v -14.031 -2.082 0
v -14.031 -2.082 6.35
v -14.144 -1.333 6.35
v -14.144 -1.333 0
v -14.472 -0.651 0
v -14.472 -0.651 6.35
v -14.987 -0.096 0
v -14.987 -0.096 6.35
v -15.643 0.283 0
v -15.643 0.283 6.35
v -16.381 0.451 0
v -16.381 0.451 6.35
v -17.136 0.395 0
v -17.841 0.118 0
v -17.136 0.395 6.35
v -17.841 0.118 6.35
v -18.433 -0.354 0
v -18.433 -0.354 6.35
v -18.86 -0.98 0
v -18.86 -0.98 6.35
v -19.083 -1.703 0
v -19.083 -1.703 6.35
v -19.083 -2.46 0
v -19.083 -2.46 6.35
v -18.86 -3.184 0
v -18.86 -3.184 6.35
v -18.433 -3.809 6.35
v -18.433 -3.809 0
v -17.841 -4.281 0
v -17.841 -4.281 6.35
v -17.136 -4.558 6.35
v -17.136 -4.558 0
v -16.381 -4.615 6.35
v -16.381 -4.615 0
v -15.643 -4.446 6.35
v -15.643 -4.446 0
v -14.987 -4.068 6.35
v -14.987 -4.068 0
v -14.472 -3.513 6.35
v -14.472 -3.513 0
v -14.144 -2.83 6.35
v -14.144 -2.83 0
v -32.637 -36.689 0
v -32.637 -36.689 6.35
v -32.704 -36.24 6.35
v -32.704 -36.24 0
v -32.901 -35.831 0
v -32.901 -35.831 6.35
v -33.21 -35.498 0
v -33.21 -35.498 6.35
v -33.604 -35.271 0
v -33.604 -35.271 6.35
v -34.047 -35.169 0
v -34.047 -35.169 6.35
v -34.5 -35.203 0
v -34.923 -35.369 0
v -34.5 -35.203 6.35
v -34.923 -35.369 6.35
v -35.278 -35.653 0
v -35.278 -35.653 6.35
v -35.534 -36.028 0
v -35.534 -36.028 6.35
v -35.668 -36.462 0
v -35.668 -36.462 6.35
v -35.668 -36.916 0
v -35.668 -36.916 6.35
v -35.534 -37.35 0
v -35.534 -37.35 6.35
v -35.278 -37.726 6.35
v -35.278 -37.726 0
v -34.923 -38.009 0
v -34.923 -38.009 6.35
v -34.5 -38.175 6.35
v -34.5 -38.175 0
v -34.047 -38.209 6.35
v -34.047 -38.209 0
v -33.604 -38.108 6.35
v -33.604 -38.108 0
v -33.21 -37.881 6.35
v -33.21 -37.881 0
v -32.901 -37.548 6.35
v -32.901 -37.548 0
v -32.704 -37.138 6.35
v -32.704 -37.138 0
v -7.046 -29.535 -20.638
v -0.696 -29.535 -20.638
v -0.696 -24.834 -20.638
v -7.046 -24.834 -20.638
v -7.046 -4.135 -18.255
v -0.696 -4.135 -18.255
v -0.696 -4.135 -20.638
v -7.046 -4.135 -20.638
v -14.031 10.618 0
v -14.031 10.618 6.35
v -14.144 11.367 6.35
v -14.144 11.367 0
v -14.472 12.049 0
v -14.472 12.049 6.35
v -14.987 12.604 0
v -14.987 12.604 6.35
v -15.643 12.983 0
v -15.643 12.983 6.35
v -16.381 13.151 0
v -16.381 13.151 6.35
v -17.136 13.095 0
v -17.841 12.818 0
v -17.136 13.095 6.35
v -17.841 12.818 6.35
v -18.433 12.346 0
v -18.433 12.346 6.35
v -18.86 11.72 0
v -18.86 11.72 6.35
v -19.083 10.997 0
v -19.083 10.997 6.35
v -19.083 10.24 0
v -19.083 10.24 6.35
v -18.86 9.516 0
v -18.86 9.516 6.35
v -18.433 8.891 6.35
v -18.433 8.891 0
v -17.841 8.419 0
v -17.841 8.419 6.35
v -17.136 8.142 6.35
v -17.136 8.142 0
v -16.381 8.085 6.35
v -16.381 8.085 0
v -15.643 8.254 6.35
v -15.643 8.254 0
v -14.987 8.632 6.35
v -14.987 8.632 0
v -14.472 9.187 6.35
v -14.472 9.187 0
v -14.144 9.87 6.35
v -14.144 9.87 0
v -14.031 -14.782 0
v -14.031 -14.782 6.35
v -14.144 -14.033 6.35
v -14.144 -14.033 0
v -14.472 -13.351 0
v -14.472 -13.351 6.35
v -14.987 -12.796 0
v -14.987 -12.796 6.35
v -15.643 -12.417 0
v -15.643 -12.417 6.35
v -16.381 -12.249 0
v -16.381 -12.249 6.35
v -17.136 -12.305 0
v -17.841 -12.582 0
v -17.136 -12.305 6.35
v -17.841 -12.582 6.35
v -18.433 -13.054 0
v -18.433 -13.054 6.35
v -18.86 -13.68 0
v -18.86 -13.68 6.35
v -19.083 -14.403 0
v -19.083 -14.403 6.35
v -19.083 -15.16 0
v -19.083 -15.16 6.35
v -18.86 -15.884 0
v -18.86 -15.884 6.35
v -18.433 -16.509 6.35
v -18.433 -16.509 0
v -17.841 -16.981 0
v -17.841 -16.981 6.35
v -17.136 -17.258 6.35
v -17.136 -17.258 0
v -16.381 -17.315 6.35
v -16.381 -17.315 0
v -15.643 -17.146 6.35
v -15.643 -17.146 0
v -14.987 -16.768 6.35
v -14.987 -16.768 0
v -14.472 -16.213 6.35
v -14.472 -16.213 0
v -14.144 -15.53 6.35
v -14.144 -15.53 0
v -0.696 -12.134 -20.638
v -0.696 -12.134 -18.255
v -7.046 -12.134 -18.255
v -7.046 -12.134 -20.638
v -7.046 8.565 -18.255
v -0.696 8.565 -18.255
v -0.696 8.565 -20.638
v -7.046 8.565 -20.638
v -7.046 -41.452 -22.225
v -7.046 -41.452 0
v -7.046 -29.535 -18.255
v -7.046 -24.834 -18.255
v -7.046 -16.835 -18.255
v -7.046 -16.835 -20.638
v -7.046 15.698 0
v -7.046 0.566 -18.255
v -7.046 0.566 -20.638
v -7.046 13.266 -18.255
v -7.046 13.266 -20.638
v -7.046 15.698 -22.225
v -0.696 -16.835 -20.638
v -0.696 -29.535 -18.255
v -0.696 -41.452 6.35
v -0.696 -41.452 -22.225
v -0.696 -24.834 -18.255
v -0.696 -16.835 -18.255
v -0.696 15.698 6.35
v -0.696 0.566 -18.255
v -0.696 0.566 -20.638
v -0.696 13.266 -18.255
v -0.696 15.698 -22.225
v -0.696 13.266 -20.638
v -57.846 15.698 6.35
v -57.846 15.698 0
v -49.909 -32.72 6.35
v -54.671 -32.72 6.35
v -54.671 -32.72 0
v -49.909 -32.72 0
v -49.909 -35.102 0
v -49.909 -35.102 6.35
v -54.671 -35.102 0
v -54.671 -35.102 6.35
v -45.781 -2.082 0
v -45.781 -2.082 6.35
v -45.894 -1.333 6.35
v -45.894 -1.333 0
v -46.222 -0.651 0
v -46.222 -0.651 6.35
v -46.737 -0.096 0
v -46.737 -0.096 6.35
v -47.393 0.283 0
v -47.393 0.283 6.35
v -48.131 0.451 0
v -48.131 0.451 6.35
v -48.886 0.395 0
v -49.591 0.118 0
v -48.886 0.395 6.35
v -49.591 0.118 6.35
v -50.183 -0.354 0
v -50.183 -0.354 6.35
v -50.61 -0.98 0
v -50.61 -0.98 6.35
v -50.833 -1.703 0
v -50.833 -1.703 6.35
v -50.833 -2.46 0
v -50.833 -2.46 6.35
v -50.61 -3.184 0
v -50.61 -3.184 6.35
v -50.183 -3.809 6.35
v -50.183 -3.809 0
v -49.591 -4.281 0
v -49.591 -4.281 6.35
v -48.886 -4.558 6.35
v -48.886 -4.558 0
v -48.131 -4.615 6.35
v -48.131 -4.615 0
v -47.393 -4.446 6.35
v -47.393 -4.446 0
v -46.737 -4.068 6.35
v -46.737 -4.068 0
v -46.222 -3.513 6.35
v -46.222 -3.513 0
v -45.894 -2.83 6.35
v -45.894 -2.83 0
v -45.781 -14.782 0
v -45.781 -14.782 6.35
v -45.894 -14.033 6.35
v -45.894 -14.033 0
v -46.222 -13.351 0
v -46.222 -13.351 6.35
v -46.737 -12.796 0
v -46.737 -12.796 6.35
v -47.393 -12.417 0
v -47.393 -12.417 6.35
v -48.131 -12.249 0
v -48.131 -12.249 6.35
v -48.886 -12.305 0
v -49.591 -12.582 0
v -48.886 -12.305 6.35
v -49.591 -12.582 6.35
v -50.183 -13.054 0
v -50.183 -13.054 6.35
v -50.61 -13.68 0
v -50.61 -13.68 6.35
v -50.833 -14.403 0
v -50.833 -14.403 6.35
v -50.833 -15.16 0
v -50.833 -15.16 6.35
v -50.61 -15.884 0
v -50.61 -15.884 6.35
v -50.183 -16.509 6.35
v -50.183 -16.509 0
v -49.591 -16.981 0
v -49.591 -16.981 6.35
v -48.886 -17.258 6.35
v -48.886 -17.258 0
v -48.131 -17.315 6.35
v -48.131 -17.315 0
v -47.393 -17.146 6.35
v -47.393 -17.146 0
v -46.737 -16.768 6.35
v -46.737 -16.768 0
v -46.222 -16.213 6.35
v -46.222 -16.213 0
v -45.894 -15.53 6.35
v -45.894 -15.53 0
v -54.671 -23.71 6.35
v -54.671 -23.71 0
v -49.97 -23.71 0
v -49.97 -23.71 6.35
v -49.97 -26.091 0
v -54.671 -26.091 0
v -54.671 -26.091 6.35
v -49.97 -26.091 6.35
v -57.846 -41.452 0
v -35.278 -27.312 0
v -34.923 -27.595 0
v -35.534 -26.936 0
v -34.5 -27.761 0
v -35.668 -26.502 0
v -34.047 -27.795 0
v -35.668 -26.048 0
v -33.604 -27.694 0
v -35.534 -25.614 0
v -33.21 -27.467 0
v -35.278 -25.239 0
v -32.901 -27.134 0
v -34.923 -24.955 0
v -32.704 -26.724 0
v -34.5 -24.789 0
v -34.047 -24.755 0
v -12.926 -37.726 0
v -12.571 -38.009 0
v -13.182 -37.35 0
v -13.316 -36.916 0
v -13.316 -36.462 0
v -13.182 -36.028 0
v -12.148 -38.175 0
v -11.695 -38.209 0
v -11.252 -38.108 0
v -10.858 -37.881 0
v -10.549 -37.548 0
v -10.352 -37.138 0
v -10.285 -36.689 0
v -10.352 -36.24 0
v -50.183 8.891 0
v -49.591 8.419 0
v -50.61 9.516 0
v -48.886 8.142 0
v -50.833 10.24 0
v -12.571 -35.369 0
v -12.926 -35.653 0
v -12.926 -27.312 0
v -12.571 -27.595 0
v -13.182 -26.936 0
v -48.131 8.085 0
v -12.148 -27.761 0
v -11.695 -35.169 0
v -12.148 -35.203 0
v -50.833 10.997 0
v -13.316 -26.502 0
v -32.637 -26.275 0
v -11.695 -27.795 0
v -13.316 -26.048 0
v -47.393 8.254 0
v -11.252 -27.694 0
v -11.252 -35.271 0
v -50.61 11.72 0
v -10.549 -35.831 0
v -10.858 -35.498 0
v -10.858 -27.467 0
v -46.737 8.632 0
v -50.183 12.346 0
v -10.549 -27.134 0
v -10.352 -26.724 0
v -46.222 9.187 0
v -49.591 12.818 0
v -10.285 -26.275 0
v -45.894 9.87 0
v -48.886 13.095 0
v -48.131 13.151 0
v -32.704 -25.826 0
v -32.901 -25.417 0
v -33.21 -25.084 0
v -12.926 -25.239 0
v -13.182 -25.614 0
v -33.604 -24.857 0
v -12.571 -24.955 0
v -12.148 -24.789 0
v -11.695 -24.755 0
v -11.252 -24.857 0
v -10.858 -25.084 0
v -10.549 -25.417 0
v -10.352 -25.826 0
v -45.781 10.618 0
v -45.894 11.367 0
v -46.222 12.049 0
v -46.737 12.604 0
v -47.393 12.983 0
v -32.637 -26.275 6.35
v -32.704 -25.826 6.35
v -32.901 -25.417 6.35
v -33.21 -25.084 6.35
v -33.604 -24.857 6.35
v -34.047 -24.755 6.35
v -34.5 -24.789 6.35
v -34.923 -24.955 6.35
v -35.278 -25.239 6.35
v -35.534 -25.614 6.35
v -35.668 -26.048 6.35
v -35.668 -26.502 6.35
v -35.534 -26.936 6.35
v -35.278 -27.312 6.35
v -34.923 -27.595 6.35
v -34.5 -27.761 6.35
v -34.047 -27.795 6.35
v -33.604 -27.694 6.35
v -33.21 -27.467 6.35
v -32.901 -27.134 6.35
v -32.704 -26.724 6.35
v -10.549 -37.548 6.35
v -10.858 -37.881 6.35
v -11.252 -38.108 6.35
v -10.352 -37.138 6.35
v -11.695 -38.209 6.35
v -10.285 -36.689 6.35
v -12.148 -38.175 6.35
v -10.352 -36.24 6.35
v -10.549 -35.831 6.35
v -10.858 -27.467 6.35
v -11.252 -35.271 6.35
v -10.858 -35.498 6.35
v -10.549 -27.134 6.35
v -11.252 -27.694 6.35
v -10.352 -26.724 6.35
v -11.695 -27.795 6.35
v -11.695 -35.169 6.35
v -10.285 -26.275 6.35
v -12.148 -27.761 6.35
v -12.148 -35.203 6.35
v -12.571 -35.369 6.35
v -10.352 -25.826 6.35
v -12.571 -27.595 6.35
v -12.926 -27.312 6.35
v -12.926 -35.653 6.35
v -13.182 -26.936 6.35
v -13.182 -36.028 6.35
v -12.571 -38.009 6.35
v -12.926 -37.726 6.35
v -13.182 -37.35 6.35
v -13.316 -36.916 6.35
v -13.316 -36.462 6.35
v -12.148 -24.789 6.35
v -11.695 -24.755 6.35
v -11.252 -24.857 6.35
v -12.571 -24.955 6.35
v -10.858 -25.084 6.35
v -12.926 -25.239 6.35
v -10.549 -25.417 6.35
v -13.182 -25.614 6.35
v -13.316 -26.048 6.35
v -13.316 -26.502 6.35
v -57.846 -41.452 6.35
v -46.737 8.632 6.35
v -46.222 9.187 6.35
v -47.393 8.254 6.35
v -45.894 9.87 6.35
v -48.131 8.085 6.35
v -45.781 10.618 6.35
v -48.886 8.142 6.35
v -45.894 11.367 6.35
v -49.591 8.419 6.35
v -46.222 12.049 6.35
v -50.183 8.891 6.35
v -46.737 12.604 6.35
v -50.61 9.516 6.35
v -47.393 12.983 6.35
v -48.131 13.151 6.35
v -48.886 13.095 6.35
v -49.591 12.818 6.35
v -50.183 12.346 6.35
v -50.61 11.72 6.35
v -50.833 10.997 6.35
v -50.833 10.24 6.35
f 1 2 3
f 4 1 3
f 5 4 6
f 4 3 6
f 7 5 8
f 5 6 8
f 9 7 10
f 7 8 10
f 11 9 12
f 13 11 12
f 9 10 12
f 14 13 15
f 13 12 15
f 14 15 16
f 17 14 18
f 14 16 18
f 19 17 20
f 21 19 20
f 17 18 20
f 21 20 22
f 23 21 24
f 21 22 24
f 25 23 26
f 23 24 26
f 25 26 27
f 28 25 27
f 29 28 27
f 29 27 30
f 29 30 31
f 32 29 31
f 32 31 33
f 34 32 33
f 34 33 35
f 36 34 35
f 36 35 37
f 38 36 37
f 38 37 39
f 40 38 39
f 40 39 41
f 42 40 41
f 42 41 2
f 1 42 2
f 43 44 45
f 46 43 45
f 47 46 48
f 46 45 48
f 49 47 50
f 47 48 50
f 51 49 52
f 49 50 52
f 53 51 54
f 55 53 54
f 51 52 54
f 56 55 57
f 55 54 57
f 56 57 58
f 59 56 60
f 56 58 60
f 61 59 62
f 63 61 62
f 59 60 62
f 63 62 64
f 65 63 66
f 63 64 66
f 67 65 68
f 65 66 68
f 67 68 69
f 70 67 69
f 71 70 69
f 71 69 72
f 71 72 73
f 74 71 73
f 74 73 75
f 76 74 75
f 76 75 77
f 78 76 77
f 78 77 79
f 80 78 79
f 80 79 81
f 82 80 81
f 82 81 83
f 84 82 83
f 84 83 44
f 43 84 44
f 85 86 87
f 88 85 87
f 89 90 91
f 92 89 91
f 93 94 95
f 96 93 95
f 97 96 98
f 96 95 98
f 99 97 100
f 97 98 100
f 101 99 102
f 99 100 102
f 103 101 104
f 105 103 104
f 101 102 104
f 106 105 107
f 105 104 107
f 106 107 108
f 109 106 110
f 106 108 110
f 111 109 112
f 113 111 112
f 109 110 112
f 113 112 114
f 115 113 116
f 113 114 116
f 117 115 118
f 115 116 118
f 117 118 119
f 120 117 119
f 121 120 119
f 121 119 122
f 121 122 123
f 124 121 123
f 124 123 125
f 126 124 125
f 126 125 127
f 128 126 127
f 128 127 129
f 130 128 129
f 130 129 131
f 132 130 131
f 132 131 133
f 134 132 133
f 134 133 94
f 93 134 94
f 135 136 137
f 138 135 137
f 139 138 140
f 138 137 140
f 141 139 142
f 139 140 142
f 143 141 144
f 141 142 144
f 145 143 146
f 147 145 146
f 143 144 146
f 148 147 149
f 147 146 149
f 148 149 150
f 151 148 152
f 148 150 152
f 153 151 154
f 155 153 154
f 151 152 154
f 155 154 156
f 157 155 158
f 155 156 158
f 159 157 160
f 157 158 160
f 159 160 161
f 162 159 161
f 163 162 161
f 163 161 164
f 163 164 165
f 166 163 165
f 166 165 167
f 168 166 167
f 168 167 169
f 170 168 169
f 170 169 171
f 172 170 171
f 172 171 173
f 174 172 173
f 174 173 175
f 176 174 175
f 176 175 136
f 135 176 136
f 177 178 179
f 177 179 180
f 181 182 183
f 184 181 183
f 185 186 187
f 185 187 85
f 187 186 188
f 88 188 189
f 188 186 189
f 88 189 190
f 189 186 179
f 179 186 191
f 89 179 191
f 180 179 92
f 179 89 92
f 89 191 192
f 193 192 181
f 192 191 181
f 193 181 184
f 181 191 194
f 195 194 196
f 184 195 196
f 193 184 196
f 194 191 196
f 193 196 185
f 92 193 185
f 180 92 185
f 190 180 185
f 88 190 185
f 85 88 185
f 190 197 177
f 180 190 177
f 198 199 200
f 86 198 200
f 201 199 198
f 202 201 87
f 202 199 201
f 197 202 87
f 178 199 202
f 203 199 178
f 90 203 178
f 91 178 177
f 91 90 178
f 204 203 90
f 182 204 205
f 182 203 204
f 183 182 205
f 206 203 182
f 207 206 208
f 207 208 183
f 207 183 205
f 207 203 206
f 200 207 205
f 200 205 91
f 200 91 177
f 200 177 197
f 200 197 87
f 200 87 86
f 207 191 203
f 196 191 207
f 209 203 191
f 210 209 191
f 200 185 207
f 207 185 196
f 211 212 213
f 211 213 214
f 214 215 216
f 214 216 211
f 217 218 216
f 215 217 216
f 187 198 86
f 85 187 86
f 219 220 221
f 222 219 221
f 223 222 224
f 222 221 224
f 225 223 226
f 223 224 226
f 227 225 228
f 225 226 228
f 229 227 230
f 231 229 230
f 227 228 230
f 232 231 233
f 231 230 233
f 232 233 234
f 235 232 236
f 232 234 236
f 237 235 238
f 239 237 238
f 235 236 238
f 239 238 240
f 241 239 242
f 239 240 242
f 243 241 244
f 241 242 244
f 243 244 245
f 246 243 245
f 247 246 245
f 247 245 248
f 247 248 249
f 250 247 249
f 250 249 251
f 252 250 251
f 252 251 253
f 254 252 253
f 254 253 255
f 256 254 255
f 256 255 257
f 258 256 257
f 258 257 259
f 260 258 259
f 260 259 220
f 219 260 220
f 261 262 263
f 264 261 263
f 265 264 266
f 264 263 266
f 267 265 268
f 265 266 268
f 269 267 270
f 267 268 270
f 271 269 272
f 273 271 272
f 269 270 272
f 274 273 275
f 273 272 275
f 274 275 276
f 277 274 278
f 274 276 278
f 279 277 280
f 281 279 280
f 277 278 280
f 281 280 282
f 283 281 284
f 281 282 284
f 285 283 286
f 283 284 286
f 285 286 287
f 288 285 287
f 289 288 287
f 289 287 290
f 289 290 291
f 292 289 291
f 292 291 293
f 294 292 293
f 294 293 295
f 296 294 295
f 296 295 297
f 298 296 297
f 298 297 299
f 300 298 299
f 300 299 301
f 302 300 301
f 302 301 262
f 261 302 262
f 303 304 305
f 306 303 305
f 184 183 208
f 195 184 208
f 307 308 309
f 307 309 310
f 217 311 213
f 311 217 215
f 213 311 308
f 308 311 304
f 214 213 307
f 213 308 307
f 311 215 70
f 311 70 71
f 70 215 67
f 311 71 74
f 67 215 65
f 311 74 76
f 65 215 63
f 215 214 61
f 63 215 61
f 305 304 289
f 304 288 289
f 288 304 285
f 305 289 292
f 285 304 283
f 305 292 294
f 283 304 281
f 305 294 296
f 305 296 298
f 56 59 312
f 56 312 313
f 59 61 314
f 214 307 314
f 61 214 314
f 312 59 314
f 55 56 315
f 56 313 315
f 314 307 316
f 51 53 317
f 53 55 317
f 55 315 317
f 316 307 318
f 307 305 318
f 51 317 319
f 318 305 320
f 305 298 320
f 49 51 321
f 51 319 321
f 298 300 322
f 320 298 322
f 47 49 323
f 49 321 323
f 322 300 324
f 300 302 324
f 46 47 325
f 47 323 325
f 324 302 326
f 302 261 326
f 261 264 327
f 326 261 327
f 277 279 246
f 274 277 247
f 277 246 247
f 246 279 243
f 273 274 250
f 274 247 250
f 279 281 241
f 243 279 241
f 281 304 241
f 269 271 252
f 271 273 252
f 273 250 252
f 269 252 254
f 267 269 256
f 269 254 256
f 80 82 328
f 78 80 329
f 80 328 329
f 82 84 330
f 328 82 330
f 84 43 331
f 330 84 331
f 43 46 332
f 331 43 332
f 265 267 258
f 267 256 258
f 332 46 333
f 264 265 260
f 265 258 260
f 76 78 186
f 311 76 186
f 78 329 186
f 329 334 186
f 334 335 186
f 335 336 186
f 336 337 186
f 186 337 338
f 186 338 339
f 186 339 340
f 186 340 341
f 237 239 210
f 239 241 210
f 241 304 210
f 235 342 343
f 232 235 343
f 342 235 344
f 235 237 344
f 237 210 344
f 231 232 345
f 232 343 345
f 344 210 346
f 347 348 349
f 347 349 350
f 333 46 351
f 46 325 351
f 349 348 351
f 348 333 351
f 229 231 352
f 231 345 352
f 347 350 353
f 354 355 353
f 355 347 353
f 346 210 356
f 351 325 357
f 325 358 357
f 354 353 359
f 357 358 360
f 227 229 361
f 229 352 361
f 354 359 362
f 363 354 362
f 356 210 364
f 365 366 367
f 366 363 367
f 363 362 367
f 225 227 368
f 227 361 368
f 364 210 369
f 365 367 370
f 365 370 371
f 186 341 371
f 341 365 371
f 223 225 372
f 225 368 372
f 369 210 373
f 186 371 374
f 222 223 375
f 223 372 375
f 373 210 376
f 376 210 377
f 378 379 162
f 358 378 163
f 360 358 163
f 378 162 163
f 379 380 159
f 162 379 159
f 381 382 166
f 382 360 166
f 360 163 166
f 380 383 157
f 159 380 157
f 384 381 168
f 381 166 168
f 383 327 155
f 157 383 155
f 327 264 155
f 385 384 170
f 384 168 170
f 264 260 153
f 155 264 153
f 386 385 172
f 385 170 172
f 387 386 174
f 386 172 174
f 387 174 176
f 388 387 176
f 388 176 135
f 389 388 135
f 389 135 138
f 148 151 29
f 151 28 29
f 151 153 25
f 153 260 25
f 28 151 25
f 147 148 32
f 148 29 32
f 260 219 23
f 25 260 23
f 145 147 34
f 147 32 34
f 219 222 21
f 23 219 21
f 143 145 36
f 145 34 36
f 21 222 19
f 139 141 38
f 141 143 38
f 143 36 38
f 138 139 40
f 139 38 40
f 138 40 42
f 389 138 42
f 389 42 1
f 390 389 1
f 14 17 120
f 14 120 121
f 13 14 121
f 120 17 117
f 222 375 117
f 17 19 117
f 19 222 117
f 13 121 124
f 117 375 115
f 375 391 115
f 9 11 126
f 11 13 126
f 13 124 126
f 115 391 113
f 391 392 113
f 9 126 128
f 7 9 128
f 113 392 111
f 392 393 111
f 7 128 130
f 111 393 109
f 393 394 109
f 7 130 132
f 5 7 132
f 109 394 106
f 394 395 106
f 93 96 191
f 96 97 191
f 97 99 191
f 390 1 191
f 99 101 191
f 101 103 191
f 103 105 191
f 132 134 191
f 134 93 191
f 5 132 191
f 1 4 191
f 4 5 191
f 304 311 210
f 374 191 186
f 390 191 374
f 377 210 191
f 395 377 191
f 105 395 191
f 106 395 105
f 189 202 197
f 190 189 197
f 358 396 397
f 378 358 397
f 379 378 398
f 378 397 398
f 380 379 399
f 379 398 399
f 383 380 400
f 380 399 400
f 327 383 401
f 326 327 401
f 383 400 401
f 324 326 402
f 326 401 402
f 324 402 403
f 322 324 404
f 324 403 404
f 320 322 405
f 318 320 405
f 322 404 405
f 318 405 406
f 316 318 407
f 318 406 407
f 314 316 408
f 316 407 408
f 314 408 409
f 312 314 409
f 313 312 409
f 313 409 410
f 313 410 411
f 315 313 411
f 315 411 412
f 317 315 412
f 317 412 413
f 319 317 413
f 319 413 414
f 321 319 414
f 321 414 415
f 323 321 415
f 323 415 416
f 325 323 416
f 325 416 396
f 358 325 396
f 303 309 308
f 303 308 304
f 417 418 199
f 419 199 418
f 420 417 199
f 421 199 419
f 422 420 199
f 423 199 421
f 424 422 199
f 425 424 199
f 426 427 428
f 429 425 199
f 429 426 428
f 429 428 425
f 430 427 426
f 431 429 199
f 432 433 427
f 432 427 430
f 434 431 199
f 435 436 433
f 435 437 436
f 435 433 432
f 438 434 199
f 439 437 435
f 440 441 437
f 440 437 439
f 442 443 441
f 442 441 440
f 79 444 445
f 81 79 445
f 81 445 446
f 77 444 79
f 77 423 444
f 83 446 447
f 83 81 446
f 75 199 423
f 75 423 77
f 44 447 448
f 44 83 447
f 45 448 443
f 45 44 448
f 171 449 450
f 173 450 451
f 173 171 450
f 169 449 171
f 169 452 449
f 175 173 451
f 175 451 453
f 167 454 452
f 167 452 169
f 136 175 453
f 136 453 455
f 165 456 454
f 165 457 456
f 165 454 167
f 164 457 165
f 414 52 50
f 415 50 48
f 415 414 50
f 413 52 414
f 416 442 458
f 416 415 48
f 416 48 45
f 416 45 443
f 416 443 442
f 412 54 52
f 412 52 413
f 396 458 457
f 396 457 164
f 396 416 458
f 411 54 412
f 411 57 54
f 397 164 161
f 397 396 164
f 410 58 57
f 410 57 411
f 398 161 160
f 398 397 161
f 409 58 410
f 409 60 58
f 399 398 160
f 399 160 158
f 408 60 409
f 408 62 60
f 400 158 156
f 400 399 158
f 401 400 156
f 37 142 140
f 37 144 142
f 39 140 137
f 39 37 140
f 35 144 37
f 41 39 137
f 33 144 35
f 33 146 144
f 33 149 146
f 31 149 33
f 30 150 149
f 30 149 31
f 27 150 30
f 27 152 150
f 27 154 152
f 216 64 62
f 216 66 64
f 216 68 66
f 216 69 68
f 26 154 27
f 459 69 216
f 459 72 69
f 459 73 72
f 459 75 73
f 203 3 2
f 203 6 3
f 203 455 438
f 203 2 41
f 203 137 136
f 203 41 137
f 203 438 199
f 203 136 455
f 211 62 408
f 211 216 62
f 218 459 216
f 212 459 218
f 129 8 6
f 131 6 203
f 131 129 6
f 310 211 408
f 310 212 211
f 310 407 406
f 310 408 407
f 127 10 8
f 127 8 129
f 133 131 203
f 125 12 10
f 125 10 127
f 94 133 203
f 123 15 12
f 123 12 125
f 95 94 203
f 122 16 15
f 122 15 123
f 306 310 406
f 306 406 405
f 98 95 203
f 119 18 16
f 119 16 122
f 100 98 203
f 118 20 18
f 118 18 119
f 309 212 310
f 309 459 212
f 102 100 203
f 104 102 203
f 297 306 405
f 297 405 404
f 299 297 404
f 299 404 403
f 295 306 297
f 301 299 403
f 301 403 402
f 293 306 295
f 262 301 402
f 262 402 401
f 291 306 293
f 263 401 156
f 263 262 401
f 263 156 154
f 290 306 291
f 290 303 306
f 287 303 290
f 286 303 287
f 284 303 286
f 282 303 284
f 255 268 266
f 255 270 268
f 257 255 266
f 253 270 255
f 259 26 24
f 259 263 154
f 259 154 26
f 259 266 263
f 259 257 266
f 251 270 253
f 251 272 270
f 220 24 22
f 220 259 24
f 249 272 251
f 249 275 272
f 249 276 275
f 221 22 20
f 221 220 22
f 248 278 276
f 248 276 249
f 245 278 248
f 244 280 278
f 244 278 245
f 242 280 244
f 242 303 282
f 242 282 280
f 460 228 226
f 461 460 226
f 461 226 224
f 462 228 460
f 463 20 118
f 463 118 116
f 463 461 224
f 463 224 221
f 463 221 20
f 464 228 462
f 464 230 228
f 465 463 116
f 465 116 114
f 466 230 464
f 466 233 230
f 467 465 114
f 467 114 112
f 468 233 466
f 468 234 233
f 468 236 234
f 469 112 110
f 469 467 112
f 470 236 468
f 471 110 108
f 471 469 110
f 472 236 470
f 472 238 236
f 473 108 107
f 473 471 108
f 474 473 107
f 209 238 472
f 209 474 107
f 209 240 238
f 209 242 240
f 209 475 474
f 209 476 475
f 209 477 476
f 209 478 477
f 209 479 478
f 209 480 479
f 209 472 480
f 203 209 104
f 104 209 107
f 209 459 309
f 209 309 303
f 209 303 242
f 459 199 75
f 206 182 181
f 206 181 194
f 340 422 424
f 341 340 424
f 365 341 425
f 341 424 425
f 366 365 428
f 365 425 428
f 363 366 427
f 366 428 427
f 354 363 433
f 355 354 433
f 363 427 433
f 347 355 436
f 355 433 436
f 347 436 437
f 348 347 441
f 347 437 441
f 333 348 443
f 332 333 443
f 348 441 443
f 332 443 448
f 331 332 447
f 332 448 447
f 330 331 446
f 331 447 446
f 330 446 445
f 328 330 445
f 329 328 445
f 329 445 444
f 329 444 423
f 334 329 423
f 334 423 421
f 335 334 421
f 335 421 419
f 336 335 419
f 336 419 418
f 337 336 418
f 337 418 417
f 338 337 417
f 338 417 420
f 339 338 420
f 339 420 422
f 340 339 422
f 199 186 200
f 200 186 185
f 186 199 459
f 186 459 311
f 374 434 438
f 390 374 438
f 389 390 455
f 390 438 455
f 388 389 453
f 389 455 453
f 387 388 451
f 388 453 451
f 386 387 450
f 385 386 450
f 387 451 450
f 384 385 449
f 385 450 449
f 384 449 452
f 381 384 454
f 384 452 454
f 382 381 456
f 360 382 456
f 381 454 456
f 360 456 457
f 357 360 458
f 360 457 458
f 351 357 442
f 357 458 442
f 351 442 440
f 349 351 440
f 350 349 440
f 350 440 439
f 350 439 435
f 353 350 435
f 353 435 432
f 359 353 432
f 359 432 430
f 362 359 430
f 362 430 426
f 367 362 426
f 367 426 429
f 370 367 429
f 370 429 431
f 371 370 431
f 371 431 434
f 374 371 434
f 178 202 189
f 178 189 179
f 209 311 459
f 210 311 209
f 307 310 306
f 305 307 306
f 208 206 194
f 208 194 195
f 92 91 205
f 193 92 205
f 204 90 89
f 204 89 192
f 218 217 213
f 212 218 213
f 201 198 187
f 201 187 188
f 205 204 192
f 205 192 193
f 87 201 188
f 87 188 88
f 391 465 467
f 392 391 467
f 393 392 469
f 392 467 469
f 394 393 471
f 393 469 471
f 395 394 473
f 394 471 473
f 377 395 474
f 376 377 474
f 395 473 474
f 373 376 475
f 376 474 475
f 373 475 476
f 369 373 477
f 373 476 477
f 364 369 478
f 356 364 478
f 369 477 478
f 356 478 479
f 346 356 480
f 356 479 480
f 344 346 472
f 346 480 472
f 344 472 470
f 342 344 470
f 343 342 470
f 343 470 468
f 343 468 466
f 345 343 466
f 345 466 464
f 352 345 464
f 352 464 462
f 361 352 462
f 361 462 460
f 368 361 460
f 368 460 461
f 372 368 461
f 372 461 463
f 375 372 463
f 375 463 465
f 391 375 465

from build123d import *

# Parameters (mm, degrees)
SKETCH1_W           = 50.8
SKETCH1_H           = 57.15
BOSS_EXTRUDE1_DEPTH = 6.35
SKETCH5_R           = 1.524
SKETCH5_R_2         = 2.54
CUT_EXTRUDE1_DEPTH  = 72.447438113
SKETCH6_W           = 4.7625
SKETCH6_H           = 2.38125
SKETCH6_W_2         = 4.700923451
CUT_EXTRUDE2_DEPTH  = 72.447438113
SKETCH9_W           = 28.575
SKETCH9_H           = 57.15
BOSS_EXTRUDE2_DEPTH = 6.35
SKETCH11_W          = 2.38252
SKETCH11_H          = 4.70154
CUT_EXTRUDE4_DEPTH  = 75.015666563
LPATTERN1_COUNT     = 4
LPATTERN1_PITCH     = 12.7


with BuildPart() as part:
    # Sketch1 → Boss-Extrude1 (new body)
    with BuildSketch(Plane.XY):
        with Locations((-32.446072824, -12.876728212)):
            Rectangle(SKETCH1_W, SKETCH1_H)
    extrude(amount=BOSS_EXTRUDE1_DEPTH)

    # Sketch5 → Cut-Extrude1 (cut, through all)
    with BuildSketch(Plane.XY.offset(6.35)):
        with Locations((-11.808572824, -26.275228212)):
            Circle(SKETCH5_R)
        with Locations((-11.808572824, -36.689228212)):
            Circle(SKETCH5_R)
        with Locations((-34.160572824, -26.275228212)):
            Circle(SKETCH5_R)
        with Locations((-34.160572824, -36.689228212)):
            Circle(SKETCH5_R)
        with Locations((-48.321072824, 10.618271788)):
            Circle(SKETCH5_R_2)
        with Locations((-16.571072824, 10.618271788)):
            Circle(SKETCH5_R_2)
        with Locations((-48.321072824, -2.081728212)):
            Circle(SKETCH5_R_2)
        with Locations((-16.571072824, -2.081728212)):
            Circle(SKETCH5_R_2)
        with Locations((-48.321072824, -14.781728212)):
            Circle(SKETCH5_R_2)
        with Locations((-16.571072824, -14.781728212)):
            Circle(SKETCH5_R_2)
    extrude(amount=-CUT_EXTRUDE1_DEPTH, mode=Mode.SUBTRACT)

    # Sketch6 → Cut-Extrude2 (cut, through all)
    with BuildSketch(Plane.XY.offset(6.35)):
        with Locations((-52.289822824, -33.911103212)):
            Rectangle(SKETCH6_W, SKETCH6_H)
        with Locations((-52.320611099, -24.900183987)):
            Rectangle(SKETCH6_W_2, SKETCH6_H)
    extrude(amount=-CUT_EXTRUDE2_DEPTH, mode=Mode.SUBTRACT)

    # Sketch9 → Boss-Extrude2 (add)
    with BuildSketch(Plane(origin=(-7.046072824, 0, 0), x_dir=(0, 0, -1), z_dir=(1, 0, 0))):
        with Locations((7.9375, -12.876728212)):
            Rectangle(SKETCH9_W, SKETCH9_H)
    extrude(amount=BOSS_EXTRUDE2_DEPTH)

    # Sketch11 → Cut-Extrude4 (cut, through all)
    with BuildSketch(Plane(origin=(-0.696072824, 0, 0), x_dir=(0, 0, -1), z_dir=(1, 0, 0))):
        with Locations((19.44624, 10.915505986)):
            Rectangle(SKETCH11_W, SKETCH11_H)
    cut_extrude4 = extrude(amount=-CUT_EXTRUDE4_DEPTH, mode=Mode.SUBTRACT)

    # LPattern1: Cut-Extrude4 ×4
    with Locations(*[(0, -i * LPATTERN1_PITCH, 0) for i in range(1, LPATTERN1_COUNT)]):
        add(cut_extrude4, mode=Mode.SUBTRACT)


solid = part.part
